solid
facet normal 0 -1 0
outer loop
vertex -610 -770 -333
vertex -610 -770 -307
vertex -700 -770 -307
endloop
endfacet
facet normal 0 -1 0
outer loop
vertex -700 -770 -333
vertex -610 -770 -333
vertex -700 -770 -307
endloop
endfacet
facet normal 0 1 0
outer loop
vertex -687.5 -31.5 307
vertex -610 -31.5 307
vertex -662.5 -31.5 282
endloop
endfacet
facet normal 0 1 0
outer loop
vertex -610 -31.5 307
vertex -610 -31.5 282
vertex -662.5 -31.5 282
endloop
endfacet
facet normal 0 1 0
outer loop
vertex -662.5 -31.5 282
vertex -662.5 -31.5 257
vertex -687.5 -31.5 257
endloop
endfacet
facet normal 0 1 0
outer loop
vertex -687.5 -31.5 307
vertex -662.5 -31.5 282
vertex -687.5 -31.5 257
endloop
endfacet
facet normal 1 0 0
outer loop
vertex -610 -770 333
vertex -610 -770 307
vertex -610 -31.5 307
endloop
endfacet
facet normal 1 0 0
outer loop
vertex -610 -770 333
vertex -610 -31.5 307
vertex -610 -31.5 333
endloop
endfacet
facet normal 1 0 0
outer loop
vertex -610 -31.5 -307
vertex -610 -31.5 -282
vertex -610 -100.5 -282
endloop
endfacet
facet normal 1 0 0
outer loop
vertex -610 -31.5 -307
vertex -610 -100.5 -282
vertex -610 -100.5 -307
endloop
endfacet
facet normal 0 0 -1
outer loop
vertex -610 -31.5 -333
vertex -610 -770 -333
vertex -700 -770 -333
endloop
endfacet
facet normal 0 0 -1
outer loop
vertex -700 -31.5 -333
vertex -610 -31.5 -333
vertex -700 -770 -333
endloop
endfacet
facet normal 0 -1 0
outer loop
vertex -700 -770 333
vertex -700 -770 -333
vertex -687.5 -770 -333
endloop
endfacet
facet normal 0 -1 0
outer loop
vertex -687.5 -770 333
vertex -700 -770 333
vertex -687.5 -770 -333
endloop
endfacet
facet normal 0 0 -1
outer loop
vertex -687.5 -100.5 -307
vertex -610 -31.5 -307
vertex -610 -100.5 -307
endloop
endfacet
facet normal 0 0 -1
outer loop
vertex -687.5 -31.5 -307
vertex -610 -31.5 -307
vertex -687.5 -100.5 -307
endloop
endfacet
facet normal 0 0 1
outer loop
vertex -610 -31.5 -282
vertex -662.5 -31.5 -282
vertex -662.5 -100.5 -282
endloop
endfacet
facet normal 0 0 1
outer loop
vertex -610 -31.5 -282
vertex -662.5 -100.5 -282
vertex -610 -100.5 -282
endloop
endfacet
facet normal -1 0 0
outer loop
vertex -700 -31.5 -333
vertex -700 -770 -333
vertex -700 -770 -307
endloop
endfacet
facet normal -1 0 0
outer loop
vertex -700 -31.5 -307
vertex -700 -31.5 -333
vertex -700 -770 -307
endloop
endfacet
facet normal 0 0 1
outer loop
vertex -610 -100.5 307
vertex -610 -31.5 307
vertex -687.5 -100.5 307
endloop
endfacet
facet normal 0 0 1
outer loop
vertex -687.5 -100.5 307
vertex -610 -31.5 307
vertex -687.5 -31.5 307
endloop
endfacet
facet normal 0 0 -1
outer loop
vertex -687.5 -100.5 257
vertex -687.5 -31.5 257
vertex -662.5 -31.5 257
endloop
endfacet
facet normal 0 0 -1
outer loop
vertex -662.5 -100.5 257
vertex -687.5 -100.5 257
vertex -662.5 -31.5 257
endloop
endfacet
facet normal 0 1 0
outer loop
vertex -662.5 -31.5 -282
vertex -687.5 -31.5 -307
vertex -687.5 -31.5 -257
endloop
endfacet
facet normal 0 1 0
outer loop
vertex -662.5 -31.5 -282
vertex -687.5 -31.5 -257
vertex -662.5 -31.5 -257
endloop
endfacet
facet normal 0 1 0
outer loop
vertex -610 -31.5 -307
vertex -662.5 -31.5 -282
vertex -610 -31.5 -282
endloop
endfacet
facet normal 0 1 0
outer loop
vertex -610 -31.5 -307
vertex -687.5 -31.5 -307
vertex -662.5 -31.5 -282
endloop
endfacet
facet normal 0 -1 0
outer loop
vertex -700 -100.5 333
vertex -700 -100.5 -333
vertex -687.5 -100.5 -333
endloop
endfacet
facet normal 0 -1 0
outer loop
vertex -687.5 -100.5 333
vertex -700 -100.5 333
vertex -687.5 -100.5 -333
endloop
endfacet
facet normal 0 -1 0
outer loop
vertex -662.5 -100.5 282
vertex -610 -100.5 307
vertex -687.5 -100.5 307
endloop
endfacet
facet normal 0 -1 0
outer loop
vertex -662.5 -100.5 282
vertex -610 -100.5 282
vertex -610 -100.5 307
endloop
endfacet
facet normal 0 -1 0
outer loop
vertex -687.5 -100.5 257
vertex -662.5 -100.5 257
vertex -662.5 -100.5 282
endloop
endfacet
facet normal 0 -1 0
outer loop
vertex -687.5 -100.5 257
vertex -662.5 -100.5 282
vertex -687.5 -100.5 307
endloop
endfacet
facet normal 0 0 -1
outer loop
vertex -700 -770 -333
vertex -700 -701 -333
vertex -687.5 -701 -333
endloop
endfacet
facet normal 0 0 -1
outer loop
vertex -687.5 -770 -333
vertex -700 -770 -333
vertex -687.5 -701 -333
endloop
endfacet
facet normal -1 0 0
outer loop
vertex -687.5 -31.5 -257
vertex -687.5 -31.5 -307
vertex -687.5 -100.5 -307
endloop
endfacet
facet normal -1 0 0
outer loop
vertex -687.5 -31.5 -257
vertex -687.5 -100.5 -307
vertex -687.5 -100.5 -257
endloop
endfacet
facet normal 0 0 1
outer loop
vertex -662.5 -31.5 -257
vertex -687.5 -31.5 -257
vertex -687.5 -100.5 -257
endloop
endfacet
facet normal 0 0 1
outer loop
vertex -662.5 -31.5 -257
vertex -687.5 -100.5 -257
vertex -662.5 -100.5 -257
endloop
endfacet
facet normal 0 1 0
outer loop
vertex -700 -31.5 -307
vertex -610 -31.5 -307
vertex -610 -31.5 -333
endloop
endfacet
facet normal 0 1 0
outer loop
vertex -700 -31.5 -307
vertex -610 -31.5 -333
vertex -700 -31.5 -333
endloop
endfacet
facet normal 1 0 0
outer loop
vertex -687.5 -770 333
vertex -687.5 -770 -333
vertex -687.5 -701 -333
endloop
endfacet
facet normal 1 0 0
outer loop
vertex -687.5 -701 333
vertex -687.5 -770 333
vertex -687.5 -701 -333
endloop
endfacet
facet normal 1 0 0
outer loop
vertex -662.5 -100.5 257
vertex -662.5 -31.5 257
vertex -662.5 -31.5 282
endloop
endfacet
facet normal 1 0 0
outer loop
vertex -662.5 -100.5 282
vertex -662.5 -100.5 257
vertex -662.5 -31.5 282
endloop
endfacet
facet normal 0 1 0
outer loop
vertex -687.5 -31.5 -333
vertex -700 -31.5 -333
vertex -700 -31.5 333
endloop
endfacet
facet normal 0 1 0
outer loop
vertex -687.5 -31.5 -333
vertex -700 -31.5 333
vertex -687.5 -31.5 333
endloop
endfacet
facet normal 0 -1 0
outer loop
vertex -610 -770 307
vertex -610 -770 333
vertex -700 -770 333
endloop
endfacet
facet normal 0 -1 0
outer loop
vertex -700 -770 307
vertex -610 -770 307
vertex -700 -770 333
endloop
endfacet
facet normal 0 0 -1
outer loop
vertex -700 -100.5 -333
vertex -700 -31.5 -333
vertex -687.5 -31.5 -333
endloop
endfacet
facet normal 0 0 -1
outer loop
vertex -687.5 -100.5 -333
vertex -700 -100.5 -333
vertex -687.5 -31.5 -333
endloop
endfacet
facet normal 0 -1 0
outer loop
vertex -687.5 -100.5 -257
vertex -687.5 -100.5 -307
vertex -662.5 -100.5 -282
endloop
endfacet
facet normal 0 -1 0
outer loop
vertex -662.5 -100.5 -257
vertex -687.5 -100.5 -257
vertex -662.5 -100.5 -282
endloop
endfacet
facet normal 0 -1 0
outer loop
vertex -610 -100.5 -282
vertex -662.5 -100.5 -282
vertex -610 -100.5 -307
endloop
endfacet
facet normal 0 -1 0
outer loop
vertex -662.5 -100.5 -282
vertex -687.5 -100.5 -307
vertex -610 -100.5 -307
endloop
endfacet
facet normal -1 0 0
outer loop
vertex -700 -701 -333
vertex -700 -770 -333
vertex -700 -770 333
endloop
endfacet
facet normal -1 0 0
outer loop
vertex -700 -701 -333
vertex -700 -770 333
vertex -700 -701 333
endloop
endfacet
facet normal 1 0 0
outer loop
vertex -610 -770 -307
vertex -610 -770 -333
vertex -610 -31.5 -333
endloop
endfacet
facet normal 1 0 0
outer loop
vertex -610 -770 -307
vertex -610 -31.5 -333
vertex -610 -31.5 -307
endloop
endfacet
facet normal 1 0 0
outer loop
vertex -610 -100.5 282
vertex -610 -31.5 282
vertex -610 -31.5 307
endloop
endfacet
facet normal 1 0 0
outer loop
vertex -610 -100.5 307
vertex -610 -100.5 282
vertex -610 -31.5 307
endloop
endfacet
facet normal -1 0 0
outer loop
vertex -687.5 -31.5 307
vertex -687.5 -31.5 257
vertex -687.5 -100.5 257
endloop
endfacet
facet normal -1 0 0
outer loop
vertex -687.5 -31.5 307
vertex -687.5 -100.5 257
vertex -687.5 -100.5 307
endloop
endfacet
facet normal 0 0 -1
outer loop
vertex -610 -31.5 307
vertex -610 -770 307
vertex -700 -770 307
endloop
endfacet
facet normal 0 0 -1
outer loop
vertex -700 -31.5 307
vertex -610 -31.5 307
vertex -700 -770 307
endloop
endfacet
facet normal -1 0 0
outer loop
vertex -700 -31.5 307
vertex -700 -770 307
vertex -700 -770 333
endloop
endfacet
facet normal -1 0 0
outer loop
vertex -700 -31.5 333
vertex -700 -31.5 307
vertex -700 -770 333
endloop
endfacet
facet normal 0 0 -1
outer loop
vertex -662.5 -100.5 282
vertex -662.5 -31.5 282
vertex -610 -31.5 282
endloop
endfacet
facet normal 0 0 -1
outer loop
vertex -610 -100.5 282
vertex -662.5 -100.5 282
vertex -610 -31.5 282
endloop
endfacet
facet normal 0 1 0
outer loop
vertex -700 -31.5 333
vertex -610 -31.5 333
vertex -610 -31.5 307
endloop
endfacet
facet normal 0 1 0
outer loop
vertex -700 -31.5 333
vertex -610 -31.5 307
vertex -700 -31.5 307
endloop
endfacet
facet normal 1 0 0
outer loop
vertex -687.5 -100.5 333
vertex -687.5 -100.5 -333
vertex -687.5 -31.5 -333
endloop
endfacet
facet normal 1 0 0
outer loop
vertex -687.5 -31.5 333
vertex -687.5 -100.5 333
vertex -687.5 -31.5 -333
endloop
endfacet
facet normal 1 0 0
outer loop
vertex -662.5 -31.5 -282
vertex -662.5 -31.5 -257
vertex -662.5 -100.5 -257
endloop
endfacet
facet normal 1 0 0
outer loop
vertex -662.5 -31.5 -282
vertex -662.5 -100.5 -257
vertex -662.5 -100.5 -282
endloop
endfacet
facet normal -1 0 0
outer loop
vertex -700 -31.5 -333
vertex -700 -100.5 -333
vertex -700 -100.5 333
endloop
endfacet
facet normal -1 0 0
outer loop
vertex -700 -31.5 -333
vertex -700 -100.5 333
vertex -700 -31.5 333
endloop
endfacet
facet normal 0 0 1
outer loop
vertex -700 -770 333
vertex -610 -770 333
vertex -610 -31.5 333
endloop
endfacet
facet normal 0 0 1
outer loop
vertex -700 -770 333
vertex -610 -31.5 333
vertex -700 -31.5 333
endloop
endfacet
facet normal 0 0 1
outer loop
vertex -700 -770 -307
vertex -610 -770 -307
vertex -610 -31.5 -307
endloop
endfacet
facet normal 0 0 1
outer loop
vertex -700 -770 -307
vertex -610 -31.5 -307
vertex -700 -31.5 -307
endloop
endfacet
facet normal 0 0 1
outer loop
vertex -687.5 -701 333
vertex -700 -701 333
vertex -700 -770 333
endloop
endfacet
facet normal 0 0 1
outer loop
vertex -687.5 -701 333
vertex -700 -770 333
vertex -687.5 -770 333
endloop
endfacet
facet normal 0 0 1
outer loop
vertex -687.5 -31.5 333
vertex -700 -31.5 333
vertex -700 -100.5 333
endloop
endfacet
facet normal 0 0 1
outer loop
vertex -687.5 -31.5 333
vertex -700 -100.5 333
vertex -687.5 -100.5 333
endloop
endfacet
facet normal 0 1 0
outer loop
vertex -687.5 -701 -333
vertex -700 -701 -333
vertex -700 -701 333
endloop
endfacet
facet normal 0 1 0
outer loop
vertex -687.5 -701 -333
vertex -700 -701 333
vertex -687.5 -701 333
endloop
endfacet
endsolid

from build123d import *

# Parameters (mm, degrees)
BOSS_EXTRUDE1_START   = 130
SKETCH3_W             = 90
SKETCH3_H             = 26
BOSS_EXTRUDE1_DEPTH   = 738.5
BOSS_EXTRUDE1_2_DEPTH = 738.5
BOSS_EXTRUDE2_START   = -333
SKETCH5_W             = 12.5
SKETCH5_H             = 69
BOSS_EXTRUDE2_DEPTH   = 666
BOSS_EXTRUDE2_2_DEPTH = 666
BOSS_EXTRUDE3_DEPTH   = 69
BOSS_EXTRUDE3_2_DEPTH = 69


with BuildPart() as part:
    # Sketch3 → Boss-Extrude1 (new body)
    with BuildSketch(Plane(origin=(0, -900, 0), x_dir=(-1, 0, 0), z_dir=(0, 1, 0)).offset(BOSS_EXTRUDE1_START)):
        with Locations((655, 320)):
            Rectangle(SKETCH3_W, SKETCH3_H)
    extrude(amount=BOSS_EXTRUDE1_DEPTH)


with BuildPart() as body_2:
    # Sketch3 → Boss-Extrude1 2 (new body)
    with BuildSketch(Plane(origin=(0, -900, 0), x_dir=(-1, 0, 0), z_dir=(0, 1, 0)).offset(BOSS_EXTRUDE1_START)):
        with Locations((655, -320)):
            Rectangle(SKETCH3_W, SKETCH3_H)
    extrude(amount=BOSS_EXTRUDE1_2_DEPTH)


with BuildPart() as body_3:
    # Sketch5 → Boss-Extrude2 (new body)
    with BuildSketch(Plane.XY.offset(BOSS_EXTRUDE2_START)):
        with Locations((-693.75, -66)):
            Rectangle(SKETCH5_W, SKETCH5_H)
    extrude(amount=BOSS_EXTRUDE2_DEPTH)


with BuildPart() as body_4:
    # Sketch5 → Boss-Extrude2 2 (new body)
    with BuildSketch(Plane.XY.offset(BOSS_EXTRUDE2_START)):
        with Locations((-693.75, -735.5)):
            Rectangle(SKETCH5_W, SKETCH5_H)
    extrude(amount=BOSS_EXTRUDE2_2_DEPTH)


with BuildPart() as body_5:
    # Sketch7 → Boss-Extrude3 (new body)
    with BuildSketch(Plane(origin=(0, -31.5, 0), x_dir=(1, 0, 0), z_dir=(0, 1, 0))):
        Polygon((-610, 307), (-687.5, 307), (-687.5, 282), (-687.5, 257), (-662.5, 257), (-662.5, 282), (-610, 282), align=None)
    extrude(amount=-BOSS_EXTRUDE3_DEPTH)


with BuildPart() as body_6:
    # Sketch7 → Boss-Extrude3 2 (new body)
    with BuildSketch(Plane(origin=(0, -31.5, 0), x_dir=(1, 0, 0), z_dir=(0, 1, 0))):
        Polygon((-610, -307), (-687.5, -307), (-687.5, -282), (-687.5, -257), (-662.5, -257), (-662.5, -282), (-610, -282), align=None)
    extrude(amount=-BOSS_EXTRUDE3_2_DEPTH)


solid = Compound([part.part, body_2.part, body_3.part, body_4.part, body_5.part, body_6.part])
